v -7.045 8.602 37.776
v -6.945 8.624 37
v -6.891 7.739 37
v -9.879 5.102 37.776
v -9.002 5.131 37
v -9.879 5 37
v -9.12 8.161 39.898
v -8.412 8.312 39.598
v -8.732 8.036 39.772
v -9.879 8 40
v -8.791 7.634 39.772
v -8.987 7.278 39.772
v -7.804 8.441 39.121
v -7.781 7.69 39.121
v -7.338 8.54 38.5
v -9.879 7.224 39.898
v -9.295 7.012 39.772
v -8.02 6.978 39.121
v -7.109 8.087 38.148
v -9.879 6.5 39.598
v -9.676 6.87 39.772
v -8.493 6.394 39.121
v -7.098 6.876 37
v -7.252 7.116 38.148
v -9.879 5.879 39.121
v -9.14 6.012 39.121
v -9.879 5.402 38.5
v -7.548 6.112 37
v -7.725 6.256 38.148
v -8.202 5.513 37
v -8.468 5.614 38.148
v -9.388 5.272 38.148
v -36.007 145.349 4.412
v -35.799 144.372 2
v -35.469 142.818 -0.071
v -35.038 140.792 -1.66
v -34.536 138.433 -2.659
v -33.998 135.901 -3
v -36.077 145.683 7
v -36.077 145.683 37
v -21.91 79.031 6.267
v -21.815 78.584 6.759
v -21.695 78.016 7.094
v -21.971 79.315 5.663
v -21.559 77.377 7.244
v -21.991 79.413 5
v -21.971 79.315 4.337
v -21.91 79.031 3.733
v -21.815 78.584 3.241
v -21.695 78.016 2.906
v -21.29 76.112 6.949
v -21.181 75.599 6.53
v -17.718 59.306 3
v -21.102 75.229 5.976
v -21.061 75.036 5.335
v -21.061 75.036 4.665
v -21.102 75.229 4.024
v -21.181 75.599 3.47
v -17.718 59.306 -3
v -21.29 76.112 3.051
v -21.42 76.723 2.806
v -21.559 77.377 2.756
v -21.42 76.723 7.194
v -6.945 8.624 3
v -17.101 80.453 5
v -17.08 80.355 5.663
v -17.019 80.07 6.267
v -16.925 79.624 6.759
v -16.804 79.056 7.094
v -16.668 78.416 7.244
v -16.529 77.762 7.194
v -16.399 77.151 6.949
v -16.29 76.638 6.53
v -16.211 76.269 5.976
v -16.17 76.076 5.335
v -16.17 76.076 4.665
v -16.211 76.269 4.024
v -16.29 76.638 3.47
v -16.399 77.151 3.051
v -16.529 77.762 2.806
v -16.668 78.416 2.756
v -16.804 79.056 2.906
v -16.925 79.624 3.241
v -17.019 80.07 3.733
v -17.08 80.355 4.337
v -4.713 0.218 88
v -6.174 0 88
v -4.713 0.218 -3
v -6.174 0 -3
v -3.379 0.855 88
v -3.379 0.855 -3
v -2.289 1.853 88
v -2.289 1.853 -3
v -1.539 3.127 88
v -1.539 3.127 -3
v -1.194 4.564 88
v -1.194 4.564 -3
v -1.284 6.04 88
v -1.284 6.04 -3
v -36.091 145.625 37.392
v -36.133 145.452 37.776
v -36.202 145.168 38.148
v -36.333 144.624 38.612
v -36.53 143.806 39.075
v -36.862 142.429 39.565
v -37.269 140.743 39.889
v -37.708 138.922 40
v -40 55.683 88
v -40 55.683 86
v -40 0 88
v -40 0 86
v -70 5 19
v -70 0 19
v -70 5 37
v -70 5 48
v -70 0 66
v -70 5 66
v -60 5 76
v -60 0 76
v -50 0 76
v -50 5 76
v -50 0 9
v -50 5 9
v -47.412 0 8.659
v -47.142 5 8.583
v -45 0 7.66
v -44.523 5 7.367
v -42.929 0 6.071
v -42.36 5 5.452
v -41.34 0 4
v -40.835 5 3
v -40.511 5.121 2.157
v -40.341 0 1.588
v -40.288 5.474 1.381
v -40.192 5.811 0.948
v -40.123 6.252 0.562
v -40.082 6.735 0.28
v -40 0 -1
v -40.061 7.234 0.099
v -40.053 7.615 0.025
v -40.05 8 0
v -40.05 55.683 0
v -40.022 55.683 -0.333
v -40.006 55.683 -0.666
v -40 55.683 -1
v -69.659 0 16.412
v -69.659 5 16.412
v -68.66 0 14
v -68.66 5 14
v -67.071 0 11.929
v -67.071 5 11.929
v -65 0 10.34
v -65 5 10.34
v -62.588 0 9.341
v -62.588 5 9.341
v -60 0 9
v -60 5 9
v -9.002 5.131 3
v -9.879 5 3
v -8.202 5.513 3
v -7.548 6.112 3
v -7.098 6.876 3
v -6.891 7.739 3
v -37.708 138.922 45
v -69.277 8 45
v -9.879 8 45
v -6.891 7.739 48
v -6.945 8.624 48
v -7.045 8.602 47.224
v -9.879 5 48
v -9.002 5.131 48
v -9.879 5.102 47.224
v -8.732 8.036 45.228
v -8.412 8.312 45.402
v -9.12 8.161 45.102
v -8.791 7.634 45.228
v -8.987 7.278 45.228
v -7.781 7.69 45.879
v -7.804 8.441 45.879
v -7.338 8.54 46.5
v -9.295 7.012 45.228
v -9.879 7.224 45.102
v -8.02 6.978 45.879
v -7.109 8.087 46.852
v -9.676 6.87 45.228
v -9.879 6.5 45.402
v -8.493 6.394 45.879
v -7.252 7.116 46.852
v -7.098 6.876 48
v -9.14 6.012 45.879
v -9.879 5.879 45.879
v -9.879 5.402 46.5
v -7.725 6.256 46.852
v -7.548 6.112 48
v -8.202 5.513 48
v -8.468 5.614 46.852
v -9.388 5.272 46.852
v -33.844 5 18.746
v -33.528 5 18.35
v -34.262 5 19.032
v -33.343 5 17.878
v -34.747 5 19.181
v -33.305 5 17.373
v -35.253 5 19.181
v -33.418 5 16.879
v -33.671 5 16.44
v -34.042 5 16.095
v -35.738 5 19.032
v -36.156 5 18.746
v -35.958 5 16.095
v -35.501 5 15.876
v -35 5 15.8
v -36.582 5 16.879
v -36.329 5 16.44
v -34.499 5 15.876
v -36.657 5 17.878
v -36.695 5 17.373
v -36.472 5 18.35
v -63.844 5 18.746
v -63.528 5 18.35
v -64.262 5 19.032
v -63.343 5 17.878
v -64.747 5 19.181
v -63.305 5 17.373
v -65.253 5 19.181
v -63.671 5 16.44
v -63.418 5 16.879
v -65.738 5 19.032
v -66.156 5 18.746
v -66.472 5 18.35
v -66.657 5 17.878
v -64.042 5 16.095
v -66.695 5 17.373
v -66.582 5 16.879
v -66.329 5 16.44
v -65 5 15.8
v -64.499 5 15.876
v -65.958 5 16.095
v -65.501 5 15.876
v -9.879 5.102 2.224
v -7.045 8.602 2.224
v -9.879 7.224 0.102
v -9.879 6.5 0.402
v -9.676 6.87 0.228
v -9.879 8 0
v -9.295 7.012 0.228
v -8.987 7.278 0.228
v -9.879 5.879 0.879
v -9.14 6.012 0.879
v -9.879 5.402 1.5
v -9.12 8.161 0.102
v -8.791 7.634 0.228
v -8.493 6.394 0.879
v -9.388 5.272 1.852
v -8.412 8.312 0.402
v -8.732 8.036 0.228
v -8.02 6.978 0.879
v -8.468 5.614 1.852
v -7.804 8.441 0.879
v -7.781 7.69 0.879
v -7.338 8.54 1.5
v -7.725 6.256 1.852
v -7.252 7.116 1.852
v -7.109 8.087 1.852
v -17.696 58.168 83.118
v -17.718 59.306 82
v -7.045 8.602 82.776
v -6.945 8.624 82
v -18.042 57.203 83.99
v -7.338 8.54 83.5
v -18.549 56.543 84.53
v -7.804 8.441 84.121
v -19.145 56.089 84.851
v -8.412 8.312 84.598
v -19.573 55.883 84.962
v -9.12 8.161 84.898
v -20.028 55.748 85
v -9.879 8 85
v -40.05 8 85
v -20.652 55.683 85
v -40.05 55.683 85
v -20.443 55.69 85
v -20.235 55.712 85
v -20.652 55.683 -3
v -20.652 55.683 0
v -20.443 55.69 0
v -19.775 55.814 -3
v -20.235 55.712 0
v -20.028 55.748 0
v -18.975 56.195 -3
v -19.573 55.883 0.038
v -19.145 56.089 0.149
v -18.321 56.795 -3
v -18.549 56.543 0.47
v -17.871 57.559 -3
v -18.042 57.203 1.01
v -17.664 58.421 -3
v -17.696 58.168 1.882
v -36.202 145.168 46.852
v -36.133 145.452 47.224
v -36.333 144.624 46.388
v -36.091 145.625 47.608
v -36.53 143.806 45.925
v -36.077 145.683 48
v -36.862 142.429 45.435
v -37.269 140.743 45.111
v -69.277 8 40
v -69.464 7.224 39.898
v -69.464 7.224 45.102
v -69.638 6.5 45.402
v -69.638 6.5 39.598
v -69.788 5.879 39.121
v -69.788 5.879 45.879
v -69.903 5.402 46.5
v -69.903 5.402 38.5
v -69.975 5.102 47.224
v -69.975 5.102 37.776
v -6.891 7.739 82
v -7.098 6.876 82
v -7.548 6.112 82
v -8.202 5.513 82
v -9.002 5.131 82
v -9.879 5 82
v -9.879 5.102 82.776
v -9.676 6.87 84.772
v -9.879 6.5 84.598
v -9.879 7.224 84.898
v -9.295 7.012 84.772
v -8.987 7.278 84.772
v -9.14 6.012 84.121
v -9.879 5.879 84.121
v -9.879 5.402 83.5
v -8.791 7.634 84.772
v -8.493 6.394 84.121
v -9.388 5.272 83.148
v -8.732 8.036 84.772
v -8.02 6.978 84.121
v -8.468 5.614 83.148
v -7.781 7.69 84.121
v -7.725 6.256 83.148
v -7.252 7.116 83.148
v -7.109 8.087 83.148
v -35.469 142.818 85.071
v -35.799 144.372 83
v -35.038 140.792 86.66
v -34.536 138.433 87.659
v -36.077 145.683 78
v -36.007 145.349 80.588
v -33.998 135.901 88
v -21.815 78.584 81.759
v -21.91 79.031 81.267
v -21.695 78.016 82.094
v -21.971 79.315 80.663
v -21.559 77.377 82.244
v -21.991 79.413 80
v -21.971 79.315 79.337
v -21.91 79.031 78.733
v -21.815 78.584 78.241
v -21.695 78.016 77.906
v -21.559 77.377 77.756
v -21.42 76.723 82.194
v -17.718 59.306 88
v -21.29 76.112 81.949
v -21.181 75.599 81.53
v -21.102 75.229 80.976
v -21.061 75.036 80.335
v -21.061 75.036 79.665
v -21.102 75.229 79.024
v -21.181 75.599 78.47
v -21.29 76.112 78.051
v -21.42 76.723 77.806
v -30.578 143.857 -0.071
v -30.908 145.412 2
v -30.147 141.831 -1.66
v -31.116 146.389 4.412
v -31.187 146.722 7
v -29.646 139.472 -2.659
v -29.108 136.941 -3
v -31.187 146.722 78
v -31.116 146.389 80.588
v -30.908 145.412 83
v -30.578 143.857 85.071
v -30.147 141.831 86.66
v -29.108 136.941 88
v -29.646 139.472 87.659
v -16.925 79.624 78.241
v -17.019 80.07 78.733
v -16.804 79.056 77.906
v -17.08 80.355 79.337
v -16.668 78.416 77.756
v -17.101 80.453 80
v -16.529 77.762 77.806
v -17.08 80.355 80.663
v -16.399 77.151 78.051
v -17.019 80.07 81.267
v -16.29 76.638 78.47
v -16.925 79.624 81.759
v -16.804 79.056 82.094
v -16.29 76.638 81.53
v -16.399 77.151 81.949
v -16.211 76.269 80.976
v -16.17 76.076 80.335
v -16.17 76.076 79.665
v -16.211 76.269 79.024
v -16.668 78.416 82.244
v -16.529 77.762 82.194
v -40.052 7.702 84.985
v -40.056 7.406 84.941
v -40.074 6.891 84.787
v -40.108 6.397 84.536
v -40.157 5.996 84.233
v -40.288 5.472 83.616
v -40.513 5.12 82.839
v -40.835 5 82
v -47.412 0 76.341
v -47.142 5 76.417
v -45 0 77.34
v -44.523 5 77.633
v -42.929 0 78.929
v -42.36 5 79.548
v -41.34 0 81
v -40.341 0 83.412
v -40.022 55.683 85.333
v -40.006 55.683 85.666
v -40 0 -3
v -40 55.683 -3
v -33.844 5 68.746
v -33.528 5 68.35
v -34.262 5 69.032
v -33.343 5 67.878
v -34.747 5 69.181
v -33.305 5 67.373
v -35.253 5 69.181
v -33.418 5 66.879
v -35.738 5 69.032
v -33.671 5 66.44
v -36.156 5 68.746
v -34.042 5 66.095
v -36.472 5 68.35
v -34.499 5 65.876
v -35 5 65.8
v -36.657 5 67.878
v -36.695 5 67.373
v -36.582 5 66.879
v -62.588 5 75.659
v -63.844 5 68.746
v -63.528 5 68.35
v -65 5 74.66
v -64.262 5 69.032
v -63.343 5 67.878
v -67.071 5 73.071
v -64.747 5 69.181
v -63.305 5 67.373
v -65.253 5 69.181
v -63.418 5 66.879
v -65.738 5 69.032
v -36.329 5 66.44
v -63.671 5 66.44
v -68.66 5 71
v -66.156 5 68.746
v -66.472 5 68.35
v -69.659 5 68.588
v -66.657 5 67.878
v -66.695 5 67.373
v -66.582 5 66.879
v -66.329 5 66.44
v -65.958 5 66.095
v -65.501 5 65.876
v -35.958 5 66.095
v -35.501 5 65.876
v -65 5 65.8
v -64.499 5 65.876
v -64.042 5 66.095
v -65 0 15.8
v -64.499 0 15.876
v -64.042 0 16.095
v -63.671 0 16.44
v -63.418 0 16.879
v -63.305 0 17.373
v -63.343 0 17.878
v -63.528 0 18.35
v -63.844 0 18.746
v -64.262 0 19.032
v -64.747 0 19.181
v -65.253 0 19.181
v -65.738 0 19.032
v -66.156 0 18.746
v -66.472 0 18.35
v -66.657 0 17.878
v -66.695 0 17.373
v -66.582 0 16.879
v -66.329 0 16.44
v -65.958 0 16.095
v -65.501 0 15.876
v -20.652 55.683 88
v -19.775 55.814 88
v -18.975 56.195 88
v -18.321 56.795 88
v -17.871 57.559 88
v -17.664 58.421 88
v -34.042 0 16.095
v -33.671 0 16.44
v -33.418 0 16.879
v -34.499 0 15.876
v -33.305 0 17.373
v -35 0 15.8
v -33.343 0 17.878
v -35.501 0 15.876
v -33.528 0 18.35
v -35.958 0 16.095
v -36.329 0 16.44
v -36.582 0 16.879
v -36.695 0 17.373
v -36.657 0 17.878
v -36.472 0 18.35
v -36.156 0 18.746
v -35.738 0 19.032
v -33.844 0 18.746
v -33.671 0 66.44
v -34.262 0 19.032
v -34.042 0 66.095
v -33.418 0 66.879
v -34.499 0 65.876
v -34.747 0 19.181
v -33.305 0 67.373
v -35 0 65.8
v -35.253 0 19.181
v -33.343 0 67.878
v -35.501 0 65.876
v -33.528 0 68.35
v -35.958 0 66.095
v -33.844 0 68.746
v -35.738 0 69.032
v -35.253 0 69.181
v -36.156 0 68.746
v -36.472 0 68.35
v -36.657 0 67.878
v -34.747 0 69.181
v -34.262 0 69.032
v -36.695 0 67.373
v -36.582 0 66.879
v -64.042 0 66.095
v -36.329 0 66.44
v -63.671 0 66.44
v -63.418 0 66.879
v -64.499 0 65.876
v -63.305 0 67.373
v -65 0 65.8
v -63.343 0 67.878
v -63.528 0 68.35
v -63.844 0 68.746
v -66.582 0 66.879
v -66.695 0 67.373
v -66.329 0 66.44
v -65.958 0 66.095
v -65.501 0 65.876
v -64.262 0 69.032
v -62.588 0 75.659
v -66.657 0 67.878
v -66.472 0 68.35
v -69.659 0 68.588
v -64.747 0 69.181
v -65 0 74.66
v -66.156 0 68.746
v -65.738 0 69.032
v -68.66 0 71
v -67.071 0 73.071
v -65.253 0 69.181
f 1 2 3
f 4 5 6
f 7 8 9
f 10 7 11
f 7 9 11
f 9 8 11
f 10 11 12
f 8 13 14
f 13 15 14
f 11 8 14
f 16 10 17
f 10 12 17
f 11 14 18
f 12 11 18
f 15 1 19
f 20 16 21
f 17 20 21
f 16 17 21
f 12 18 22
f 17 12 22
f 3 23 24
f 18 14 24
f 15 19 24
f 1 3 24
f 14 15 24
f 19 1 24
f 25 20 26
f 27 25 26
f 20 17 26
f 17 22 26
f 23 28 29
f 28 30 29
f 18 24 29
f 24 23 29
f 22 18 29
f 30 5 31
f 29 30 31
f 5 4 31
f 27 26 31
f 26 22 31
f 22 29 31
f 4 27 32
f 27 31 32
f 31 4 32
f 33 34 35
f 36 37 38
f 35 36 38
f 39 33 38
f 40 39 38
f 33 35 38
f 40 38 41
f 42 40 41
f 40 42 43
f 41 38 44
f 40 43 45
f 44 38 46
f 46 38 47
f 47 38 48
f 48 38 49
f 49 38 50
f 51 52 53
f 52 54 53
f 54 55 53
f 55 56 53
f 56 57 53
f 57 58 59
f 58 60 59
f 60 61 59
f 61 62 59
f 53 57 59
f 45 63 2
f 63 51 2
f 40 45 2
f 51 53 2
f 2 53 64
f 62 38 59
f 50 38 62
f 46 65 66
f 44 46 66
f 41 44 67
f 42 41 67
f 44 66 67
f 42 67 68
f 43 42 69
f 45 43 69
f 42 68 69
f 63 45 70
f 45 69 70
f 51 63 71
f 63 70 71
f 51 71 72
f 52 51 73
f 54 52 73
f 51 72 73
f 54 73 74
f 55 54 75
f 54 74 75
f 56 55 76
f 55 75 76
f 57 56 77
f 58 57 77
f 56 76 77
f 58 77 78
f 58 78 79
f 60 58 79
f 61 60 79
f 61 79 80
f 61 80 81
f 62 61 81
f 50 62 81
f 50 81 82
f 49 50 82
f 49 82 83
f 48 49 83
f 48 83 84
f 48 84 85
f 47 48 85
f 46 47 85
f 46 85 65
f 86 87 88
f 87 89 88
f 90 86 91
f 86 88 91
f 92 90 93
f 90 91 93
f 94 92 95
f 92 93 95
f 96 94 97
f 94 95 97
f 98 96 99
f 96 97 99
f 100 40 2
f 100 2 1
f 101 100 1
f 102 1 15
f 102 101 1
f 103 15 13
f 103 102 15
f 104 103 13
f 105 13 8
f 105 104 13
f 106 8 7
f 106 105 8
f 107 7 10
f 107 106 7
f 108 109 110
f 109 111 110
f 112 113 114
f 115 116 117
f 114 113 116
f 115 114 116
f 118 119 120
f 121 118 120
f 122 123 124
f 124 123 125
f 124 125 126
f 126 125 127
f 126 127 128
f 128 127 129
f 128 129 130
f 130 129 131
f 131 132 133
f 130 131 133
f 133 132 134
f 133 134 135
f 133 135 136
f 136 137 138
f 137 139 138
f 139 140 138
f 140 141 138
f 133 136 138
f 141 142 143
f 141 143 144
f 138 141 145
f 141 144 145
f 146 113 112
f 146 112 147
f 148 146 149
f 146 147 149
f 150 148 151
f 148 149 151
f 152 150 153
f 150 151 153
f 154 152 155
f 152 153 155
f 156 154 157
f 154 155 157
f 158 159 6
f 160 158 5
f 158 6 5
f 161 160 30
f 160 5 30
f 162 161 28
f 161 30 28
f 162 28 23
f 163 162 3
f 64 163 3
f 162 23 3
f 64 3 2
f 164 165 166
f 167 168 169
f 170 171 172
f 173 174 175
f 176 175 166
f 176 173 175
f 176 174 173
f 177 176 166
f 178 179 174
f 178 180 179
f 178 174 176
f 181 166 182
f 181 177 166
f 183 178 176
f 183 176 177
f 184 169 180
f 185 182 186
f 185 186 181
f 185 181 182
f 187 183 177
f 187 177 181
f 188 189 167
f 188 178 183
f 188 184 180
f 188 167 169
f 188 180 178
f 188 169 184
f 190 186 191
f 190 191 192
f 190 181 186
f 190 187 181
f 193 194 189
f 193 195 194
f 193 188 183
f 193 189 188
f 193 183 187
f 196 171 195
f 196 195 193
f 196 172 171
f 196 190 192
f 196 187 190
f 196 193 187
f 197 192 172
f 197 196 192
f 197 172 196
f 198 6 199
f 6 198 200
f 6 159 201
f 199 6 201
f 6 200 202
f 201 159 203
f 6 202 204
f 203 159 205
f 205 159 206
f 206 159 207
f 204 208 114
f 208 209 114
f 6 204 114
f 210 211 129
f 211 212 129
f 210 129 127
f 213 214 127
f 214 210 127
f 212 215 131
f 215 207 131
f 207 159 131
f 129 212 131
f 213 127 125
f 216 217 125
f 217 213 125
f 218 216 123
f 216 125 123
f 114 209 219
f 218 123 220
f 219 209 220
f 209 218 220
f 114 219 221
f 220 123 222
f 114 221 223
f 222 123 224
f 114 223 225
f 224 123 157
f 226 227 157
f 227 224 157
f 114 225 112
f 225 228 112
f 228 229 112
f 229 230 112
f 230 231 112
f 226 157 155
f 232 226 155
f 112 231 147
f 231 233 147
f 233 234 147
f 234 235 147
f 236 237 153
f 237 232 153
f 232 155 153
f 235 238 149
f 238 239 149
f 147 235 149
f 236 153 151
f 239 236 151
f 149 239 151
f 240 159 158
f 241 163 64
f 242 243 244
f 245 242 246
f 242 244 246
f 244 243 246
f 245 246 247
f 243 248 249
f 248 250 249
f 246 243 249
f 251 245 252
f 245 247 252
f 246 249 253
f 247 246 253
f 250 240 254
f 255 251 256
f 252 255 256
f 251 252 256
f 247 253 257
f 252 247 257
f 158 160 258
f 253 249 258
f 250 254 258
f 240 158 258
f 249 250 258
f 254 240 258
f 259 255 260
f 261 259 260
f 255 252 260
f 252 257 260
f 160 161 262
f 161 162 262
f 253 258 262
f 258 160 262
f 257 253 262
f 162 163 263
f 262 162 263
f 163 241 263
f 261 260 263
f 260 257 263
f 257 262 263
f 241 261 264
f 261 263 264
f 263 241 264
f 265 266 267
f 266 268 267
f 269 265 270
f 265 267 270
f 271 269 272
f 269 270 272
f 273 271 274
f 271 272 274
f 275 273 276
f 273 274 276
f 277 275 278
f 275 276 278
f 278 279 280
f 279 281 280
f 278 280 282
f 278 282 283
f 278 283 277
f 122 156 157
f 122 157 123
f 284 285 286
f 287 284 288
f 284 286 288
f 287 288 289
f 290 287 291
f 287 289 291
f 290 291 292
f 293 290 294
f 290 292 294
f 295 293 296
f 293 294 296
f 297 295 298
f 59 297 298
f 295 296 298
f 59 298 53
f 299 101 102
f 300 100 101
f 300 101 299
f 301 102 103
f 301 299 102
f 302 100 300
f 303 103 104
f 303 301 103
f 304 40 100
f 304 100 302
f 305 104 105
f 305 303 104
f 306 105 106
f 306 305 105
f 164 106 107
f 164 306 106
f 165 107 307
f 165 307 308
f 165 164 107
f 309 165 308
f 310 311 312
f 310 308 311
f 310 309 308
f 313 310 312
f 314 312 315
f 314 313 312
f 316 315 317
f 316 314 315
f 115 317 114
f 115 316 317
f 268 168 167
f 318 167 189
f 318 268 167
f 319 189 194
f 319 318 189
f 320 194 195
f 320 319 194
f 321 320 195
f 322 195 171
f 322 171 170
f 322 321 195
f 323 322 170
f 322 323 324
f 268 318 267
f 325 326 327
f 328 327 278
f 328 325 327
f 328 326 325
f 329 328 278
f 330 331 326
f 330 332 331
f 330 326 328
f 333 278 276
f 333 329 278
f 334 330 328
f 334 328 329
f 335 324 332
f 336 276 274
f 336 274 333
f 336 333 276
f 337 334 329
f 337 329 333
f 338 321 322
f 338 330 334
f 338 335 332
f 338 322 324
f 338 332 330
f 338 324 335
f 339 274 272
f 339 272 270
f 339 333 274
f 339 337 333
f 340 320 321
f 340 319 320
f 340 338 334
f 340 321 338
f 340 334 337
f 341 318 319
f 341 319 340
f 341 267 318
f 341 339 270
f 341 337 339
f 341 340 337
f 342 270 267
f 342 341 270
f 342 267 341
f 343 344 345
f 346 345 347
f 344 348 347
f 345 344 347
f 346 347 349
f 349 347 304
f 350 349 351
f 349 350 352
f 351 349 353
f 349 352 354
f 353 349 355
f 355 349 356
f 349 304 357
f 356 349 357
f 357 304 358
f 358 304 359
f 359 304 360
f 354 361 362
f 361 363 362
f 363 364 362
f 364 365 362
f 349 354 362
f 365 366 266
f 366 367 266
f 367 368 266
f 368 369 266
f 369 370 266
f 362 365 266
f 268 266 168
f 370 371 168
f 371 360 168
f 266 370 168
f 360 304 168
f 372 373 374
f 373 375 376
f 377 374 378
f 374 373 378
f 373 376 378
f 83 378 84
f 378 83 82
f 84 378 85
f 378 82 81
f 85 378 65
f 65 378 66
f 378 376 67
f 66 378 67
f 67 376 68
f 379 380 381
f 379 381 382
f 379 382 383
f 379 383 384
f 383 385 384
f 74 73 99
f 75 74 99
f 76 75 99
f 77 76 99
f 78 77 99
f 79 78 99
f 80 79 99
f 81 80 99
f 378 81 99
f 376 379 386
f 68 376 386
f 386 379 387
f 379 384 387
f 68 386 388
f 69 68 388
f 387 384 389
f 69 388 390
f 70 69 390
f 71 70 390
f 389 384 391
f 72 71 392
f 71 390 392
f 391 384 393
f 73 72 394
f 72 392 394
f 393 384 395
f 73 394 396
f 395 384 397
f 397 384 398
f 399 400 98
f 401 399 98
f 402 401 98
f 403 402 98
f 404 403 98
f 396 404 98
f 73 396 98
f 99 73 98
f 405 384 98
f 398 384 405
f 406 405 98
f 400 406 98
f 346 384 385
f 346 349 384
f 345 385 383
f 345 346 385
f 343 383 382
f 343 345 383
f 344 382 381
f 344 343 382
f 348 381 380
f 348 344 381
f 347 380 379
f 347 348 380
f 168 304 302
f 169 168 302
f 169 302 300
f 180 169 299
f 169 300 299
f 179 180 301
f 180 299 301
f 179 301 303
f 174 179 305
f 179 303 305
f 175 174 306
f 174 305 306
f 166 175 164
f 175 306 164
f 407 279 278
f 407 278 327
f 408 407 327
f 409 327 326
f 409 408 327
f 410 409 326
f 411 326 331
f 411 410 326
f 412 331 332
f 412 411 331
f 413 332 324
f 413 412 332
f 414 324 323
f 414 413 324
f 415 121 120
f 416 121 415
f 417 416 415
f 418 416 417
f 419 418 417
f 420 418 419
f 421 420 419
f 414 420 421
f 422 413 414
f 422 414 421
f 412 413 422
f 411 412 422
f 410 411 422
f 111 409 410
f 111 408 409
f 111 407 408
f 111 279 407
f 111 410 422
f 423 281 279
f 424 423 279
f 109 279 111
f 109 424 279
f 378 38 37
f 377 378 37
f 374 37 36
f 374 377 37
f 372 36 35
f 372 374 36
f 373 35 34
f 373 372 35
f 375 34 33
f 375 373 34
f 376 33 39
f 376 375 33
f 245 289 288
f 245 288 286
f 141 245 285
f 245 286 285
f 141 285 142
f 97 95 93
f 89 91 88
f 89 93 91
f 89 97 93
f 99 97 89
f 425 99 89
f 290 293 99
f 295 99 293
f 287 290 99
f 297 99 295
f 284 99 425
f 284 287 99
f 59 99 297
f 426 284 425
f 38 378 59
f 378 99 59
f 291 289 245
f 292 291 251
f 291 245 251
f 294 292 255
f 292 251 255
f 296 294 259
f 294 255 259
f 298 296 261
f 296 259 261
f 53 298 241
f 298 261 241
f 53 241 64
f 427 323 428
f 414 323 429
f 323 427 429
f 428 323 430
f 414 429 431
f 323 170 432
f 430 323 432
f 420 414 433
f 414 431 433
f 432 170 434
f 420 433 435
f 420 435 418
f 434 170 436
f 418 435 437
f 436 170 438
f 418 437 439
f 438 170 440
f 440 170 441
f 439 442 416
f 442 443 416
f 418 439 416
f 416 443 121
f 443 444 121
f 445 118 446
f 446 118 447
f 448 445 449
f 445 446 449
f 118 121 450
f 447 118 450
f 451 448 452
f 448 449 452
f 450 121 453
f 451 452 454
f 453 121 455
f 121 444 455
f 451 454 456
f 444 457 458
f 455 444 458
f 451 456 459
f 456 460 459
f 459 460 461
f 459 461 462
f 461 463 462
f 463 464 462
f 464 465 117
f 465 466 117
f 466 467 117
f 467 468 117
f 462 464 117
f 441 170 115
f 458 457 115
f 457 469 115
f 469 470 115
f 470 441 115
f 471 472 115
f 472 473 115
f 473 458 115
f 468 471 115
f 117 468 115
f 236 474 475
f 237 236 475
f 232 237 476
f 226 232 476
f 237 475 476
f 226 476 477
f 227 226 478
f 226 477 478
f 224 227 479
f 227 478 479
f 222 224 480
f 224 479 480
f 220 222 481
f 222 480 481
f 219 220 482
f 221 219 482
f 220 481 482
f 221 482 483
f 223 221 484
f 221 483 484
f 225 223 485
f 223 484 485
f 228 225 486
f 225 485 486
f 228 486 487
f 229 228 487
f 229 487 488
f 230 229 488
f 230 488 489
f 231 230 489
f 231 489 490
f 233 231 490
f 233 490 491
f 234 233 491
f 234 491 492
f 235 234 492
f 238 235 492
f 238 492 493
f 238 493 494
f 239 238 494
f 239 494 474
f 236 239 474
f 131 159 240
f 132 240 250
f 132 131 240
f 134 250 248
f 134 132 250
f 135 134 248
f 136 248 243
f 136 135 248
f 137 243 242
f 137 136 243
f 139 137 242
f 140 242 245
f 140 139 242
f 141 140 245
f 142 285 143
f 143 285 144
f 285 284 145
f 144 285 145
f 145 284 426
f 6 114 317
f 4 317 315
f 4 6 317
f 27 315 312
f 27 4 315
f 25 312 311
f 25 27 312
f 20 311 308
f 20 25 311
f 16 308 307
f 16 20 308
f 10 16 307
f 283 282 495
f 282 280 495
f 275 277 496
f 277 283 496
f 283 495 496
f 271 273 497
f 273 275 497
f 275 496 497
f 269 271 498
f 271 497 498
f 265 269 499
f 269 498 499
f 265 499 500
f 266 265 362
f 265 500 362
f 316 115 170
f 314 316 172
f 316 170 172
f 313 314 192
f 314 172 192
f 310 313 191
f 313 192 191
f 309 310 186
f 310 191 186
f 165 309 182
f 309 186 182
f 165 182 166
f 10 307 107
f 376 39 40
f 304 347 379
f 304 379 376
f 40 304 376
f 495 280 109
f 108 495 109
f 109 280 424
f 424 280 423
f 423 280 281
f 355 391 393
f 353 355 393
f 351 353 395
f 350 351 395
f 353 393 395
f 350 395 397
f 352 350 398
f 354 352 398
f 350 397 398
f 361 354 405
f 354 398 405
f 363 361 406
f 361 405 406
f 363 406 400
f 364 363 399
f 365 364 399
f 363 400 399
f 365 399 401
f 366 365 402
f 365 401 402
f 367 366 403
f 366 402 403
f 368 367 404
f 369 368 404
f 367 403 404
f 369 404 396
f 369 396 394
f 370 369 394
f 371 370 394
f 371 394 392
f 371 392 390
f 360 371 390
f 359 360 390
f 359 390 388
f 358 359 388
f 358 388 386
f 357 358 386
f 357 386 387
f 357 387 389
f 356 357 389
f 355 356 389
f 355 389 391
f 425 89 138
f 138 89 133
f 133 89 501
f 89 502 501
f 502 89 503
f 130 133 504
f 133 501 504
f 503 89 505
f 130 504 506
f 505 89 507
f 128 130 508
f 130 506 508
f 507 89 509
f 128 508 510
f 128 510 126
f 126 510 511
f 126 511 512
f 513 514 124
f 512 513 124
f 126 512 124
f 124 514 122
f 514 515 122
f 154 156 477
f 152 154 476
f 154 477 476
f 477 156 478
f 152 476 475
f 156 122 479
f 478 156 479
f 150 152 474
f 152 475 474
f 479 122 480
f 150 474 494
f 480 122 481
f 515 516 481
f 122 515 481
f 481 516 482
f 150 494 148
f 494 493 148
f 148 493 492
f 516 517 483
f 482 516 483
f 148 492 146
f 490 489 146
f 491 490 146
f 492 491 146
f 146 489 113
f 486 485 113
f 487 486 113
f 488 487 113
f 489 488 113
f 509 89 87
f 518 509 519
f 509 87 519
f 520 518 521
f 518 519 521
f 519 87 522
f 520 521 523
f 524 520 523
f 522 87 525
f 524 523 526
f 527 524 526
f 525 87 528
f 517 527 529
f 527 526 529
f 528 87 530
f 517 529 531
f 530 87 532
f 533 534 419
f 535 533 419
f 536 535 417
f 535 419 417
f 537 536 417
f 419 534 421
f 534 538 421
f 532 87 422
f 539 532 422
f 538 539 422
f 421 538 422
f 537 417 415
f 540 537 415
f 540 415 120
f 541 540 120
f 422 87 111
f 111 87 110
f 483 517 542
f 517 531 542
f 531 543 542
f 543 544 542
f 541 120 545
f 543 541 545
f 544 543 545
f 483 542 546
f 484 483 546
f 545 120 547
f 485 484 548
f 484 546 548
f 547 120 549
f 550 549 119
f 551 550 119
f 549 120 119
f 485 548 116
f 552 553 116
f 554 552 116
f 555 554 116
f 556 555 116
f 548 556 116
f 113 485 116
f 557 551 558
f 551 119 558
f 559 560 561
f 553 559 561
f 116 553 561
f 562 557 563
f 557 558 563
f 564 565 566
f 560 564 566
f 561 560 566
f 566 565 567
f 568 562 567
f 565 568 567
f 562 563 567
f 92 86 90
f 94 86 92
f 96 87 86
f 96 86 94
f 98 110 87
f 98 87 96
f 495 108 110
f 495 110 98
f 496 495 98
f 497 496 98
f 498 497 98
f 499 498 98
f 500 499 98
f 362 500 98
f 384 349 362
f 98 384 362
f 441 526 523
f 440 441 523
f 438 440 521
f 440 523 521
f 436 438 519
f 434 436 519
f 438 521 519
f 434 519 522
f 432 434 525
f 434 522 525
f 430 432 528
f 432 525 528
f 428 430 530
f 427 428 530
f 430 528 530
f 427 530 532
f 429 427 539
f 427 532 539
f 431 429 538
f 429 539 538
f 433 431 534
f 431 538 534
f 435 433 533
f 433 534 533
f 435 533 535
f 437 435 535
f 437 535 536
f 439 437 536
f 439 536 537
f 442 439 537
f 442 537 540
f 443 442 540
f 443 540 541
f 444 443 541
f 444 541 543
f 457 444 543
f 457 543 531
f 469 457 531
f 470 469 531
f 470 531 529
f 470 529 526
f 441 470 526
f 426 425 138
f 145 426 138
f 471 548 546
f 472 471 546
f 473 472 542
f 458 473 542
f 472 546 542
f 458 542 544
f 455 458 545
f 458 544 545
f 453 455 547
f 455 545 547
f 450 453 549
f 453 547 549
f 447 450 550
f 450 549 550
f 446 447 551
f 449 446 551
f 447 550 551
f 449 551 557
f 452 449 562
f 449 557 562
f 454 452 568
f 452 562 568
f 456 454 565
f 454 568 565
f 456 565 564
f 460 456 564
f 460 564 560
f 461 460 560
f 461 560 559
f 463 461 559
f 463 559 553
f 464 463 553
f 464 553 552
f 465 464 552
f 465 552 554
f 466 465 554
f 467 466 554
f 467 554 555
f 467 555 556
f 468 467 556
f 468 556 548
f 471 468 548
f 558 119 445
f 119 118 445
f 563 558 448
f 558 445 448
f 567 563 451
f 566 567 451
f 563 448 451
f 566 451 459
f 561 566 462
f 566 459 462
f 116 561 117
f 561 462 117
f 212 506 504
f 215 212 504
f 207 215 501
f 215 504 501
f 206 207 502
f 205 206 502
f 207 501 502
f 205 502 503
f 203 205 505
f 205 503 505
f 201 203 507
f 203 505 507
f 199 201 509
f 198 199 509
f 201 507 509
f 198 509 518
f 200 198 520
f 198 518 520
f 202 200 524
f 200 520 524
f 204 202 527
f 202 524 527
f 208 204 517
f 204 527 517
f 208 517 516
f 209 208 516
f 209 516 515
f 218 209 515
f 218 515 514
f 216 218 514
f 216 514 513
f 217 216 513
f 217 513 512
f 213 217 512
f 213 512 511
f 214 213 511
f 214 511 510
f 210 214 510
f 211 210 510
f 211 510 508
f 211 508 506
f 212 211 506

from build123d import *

# Parameters (mm, degrees)
EXTRUDE_1_DEPTH          = 85
SKETCH_3_R               = 2.2499999999999964
SKETCH_3_R_2             = 2.2500000000000018
CUT_EXTRUDE_1_DEPTH      = 19.999999999999996
EXTRUDE_2_DEPTH          = 3
EXTRUDE_3_DEPTH          = 3
FILLET_1_R               = 5
SKETCH_6_R               = 1.6999999999999973
SKETCH_6_R_2             = 1.7000000000000015
SKETCH_6_R_3             = 1.6999999999999984
SKETCH_6_R_4             = 1.6999999999999995
CUT_EXTRUDE_2_DEPTH      = 10
CUT_EXTRUDE_3_DEPTH      = 185.8550415825309
CUT_EXTRUDE_3_DEPTH_BACK = 185.8550415825309
SKETCH_8_W               = 29.999999999999993
SKETCH_8_H               = 12
SKETCH_8_H_2             = 12.000000000000002
CUT_EXTRUDE_4_DEPTH      = 150
EXTRUDE_4_DEPTH          = 5
FILLET_4_R               = 3
FILLET_5_R               = 10
FILLET_6_R               = 10


with BuildPart() as part:
    # 草图2 → 凸台-拉伸1 (new body)
    with BuildSketch(Plane.XY):
        Polygon((0, 0), (-31.18675362266453, 146.7221401100707), (-36.07749162633355, 145.6825816559819), (-6.174485782675303, 5), (-70, 4.999999999999992), (-70, 0), align=None)
    extrude(amount=EXTRUDE_1_DEPTH)

    # 草图3 → 切除-拉伸1 (cut)
    with BuildSketch(Plane(origin=(0, 0, 0), x_dir=(0, 0, -1), z_dir=(0.9781476007338048, 0.20791169081776356, 0))):
        with Locations(Location((-79.99999999999997, 79.99999999999996, 0), (0, 0, 90))):
            Circle(SKETCH_3_R)
        with Locations(Location((-4.999999999999984, 79.99999999999996, 0), (0, 0, 90))):
            Circle(SKETCH_3_R_2)
    extrude(amount=-CUT_EXTRUDE_1_DEPTH, mode=Mode.SUBTRACT)

    # 草图4 → 凸台-拉伸2 (add)
    with BuildSketch(Plane.XY.offset(85)):
        Polygon((-36.07749162633355, 145.6825816559819), (-70, 4.999999999999992), (-70, 0), (0, 0), (-31.18675362266453, 146.7221401100707), align=None)
    extrude(amount=EXTRUDE_2_DEPTH)

    # 草图5 → 凸台-拉伸3 (add)
    with BuildSketch(Plane(origin=(0, 0, 0), x_dir=(-1, 0, 0), z_dir=(0, 0, -1))):
        Polygon((36.07749162633355, 145.6825816559819), (31.18675362266453, 146.7221401100707), (0, 0), (70, 0), (70, 4.999999999999992), align=None)
    extrude(amount=EXTRUDE_3_DEPTH)

    # 圆角1
    fillet_1_edges = [part.edges().sort_by_distance(p)[0] for p in [
        (0, 0, 42.5),
    ]]
    fillet(fillet_1_edges, radius=FILLET_1_R)

    # 草图6 → 切除-拉伸2 (cut)
    with BuildSketch(Plane.XZ):
        with Locations(Location((-65, 67.5, 0), (0, 0, 270))):
            Circle(SKETCH_6_R)
        with Locations(Location((-34.99999999999999, 67.5, 0), (0, 0, 270))):
            Circle(SKETCH_6_R_2)
        with Locations(Location((-65.00000000000001, 17.5, 0), (0, 0, 270))):
            Circle(SKETCH_6_R_3)
        with Locations(Location((-34.999999999999986, 17.5, 0), (0, 0, 270))):
            Circle(SKETCH_6_R_4)
    extrude(amount=-CUT_EXTRUDE_2_DEPTH, mode=Mode.SUBTRACT)

    # 草图7 → 切除-拉伸3 (cut, two sides: drawn at the far end of the back side and taken through both)
    with BuildSketch(Plane.XY.offset(-CUT_EXTRUDE_3_DEPTH_BACK)):
        Polygon((-36.07749162633355, 145.6825816559819), (-16.94740107603117, 55.68258165598189), (-57.7790108740802, 55.682581655981885), align=None)
    extrude(amount=CUT_EXTRUDE_3_DEPTH + CUT_EXTRUDE_3_DEPTH_BACK, mode=Mode.SUBTRACT)

    # 草图8 → 切除-拉伸4 (cut)
    with BuildSketch(Plane.XZ):
        with Locations((-55, 82.00000000000001)):
            Rectangle(SKETCH_8_W, SKETCH_8_H)
        with Locations((-55, 3.000000000000001)):
            Rectangle(SKETCH_8_W, SKETCH_8_H_2)
    extrude(amount=-CUT_EXTRUDE_4_DEPTH, mode=Mode.SUBTRACT)

    # 草图9 → 凸台-拉伸4 (add)
    with BuildSketch(Plane.XY.offset(45.000000000000014)):
        Polygon((-36.077491626333554, 145.6825816559819), (-70, 5), (-6.174485782675303, 5), align=None)
    extrude(amount=-EXTRUDE_4_DEPTH)

    # 圆角4
    fillet_4_edges = [part.edges().sort_by_distance(p)[0] for p in [
        (-16.94740107603117, 55.68258165598189, -1.5),
        (-6.174485782675303, 5, 65),
        (-6.174485782675303, 5, 20.000000000000007),
        (-21.125988704504426, 75.34129082799095, 40.000000000000014),
        (-38.08724289133765, 5, 40.000000000000014),
        (-21.125988704504426, 75.34129082799095, 45.000000000000014),
        (-38.08724289133765, 5, 45.000000000000014),
        (-23.087242891337652, 4.999999999999998, 85),
        (-23.087242891337652, 4.999999999999998, 0),
        (-11.560943429353237, 30.34129082799096, 0),
        (-11.560943429353237, 30.34129082799096, 85),
        (-16.94740107603117, 55.68258165598189, 86.5),
    ]]
    fillet(fillet_4_edges, radius=FILLET_4_R)

    # 圆角5
    fillet_5_edges = [part.edges().sort_by_distance(p)[0] for p in [
        (-70, 2.499999999999996, 9.000000000000002),
        (-70, 2.499999999999996, 76.00000000000001),
        (-40.00000000000001, 2.499999999999998, 76.00000000000001),
        (-40.00000000000001, 2.499999999999998, 9.000000000000002),
    ]]
    fillet(fillet_5_edges, radius=FILLET_5_R)

    # 圆角6
    fillet_6_edges = [part.edges().sort_by_distance(p)[0] for p in [
        (-33.63212262449904, 146.2023608830263, 88),
        (-33.63212262449904, 146.2023608830263, -3),
    ]]
    fillet(fillet_6_edges, radius=FILLET_6_R)


solid = part.part
